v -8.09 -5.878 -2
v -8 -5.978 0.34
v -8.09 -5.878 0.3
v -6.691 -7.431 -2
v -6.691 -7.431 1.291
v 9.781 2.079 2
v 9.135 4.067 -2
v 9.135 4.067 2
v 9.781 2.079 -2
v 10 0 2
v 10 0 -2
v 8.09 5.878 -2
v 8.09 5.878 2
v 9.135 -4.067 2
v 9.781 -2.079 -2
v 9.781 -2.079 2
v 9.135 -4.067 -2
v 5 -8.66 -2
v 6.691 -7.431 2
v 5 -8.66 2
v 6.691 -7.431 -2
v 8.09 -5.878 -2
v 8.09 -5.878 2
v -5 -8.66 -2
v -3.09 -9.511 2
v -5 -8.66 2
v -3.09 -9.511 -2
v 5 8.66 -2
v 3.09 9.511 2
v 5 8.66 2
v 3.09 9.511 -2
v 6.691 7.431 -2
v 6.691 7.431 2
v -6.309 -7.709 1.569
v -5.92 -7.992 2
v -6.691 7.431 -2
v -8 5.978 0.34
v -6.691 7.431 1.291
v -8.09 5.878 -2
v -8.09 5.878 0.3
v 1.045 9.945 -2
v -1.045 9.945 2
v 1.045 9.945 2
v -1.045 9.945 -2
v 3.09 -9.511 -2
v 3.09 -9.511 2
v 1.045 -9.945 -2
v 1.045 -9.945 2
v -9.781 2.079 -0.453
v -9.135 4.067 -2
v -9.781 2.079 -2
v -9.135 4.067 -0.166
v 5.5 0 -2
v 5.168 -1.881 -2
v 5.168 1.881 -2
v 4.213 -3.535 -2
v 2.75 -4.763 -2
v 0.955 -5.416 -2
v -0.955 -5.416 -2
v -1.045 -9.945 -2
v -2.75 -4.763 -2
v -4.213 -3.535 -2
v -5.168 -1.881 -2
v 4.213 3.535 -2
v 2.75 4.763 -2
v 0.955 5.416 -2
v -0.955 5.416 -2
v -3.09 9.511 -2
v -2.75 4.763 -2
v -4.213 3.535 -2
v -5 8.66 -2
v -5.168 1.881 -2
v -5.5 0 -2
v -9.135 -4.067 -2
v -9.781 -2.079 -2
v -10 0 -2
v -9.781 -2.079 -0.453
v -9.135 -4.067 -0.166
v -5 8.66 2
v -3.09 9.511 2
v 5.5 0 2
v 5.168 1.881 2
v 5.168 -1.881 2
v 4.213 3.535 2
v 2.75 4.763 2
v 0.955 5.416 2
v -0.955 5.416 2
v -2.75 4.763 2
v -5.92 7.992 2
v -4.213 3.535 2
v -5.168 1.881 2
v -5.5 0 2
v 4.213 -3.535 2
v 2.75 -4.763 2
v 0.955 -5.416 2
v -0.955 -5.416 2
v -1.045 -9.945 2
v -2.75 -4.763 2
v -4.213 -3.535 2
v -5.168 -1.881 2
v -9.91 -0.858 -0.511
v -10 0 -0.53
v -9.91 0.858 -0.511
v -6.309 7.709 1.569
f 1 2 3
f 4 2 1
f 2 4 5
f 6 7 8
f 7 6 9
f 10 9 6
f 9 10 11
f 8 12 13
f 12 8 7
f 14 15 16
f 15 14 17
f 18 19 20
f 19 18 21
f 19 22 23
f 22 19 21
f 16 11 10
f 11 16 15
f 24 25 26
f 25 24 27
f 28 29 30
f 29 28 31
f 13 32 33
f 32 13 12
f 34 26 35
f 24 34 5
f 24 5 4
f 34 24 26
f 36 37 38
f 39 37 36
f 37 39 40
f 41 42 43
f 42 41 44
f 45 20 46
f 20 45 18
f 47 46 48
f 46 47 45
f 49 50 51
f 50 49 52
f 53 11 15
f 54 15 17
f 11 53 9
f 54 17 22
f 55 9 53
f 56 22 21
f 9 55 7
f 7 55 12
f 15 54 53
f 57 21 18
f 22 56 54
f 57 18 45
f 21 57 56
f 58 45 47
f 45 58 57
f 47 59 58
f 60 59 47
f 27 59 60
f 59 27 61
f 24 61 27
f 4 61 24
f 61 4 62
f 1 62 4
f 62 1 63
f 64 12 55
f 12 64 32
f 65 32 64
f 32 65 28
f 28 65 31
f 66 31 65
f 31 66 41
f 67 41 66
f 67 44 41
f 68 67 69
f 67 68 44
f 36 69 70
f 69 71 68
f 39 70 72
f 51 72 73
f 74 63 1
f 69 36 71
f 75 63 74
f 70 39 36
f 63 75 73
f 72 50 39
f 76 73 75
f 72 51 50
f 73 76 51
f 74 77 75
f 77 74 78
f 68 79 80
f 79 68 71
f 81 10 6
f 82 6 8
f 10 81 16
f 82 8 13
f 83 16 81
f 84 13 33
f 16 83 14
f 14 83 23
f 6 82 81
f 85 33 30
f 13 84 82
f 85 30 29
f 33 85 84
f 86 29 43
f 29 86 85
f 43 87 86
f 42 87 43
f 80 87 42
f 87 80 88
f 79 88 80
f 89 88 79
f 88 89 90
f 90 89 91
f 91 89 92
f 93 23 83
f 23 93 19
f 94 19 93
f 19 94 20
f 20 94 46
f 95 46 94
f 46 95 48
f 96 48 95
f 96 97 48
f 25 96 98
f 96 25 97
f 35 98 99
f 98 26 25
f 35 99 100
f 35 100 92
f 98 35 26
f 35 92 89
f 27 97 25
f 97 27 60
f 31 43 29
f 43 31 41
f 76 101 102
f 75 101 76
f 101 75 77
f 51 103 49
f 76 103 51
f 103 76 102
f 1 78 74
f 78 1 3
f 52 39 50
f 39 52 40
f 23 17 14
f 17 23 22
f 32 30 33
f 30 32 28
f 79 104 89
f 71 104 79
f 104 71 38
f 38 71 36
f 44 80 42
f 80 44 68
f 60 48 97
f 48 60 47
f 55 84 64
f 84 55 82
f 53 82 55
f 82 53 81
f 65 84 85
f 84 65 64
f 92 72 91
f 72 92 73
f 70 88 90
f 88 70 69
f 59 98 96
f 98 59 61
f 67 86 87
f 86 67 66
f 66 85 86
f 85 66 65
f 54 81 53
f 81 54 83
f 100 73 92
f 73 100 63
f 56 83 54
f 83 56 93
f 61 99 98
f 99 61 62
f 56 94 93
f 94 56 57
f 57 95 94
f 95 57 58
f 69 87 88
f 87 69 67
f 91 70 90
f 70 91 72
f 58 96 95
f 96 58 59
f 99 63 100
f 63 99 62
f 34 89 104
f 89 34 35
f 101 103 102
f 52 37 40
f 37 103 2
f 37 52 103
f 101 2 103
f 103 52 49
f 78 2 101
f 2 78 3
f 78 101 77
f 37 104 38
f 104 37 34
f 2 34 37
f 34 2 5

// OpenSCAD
epsilon = 0.1;

thickness = 4;
diam = 20;
inner_diam = 11;

difference() {
    cylinder(thickness, diam/2, diam/2, true);
    translate(-epsilon, 0, 0) {
        cylinder(thickness+epsilon, inner_diam/2, inner_diam/2, true);
    }
    
    translate([-diam/2-3, 0, 9])
        rotate([90, 0, 0]) 
            cylinder(80, 10, 10, true);
    
}
